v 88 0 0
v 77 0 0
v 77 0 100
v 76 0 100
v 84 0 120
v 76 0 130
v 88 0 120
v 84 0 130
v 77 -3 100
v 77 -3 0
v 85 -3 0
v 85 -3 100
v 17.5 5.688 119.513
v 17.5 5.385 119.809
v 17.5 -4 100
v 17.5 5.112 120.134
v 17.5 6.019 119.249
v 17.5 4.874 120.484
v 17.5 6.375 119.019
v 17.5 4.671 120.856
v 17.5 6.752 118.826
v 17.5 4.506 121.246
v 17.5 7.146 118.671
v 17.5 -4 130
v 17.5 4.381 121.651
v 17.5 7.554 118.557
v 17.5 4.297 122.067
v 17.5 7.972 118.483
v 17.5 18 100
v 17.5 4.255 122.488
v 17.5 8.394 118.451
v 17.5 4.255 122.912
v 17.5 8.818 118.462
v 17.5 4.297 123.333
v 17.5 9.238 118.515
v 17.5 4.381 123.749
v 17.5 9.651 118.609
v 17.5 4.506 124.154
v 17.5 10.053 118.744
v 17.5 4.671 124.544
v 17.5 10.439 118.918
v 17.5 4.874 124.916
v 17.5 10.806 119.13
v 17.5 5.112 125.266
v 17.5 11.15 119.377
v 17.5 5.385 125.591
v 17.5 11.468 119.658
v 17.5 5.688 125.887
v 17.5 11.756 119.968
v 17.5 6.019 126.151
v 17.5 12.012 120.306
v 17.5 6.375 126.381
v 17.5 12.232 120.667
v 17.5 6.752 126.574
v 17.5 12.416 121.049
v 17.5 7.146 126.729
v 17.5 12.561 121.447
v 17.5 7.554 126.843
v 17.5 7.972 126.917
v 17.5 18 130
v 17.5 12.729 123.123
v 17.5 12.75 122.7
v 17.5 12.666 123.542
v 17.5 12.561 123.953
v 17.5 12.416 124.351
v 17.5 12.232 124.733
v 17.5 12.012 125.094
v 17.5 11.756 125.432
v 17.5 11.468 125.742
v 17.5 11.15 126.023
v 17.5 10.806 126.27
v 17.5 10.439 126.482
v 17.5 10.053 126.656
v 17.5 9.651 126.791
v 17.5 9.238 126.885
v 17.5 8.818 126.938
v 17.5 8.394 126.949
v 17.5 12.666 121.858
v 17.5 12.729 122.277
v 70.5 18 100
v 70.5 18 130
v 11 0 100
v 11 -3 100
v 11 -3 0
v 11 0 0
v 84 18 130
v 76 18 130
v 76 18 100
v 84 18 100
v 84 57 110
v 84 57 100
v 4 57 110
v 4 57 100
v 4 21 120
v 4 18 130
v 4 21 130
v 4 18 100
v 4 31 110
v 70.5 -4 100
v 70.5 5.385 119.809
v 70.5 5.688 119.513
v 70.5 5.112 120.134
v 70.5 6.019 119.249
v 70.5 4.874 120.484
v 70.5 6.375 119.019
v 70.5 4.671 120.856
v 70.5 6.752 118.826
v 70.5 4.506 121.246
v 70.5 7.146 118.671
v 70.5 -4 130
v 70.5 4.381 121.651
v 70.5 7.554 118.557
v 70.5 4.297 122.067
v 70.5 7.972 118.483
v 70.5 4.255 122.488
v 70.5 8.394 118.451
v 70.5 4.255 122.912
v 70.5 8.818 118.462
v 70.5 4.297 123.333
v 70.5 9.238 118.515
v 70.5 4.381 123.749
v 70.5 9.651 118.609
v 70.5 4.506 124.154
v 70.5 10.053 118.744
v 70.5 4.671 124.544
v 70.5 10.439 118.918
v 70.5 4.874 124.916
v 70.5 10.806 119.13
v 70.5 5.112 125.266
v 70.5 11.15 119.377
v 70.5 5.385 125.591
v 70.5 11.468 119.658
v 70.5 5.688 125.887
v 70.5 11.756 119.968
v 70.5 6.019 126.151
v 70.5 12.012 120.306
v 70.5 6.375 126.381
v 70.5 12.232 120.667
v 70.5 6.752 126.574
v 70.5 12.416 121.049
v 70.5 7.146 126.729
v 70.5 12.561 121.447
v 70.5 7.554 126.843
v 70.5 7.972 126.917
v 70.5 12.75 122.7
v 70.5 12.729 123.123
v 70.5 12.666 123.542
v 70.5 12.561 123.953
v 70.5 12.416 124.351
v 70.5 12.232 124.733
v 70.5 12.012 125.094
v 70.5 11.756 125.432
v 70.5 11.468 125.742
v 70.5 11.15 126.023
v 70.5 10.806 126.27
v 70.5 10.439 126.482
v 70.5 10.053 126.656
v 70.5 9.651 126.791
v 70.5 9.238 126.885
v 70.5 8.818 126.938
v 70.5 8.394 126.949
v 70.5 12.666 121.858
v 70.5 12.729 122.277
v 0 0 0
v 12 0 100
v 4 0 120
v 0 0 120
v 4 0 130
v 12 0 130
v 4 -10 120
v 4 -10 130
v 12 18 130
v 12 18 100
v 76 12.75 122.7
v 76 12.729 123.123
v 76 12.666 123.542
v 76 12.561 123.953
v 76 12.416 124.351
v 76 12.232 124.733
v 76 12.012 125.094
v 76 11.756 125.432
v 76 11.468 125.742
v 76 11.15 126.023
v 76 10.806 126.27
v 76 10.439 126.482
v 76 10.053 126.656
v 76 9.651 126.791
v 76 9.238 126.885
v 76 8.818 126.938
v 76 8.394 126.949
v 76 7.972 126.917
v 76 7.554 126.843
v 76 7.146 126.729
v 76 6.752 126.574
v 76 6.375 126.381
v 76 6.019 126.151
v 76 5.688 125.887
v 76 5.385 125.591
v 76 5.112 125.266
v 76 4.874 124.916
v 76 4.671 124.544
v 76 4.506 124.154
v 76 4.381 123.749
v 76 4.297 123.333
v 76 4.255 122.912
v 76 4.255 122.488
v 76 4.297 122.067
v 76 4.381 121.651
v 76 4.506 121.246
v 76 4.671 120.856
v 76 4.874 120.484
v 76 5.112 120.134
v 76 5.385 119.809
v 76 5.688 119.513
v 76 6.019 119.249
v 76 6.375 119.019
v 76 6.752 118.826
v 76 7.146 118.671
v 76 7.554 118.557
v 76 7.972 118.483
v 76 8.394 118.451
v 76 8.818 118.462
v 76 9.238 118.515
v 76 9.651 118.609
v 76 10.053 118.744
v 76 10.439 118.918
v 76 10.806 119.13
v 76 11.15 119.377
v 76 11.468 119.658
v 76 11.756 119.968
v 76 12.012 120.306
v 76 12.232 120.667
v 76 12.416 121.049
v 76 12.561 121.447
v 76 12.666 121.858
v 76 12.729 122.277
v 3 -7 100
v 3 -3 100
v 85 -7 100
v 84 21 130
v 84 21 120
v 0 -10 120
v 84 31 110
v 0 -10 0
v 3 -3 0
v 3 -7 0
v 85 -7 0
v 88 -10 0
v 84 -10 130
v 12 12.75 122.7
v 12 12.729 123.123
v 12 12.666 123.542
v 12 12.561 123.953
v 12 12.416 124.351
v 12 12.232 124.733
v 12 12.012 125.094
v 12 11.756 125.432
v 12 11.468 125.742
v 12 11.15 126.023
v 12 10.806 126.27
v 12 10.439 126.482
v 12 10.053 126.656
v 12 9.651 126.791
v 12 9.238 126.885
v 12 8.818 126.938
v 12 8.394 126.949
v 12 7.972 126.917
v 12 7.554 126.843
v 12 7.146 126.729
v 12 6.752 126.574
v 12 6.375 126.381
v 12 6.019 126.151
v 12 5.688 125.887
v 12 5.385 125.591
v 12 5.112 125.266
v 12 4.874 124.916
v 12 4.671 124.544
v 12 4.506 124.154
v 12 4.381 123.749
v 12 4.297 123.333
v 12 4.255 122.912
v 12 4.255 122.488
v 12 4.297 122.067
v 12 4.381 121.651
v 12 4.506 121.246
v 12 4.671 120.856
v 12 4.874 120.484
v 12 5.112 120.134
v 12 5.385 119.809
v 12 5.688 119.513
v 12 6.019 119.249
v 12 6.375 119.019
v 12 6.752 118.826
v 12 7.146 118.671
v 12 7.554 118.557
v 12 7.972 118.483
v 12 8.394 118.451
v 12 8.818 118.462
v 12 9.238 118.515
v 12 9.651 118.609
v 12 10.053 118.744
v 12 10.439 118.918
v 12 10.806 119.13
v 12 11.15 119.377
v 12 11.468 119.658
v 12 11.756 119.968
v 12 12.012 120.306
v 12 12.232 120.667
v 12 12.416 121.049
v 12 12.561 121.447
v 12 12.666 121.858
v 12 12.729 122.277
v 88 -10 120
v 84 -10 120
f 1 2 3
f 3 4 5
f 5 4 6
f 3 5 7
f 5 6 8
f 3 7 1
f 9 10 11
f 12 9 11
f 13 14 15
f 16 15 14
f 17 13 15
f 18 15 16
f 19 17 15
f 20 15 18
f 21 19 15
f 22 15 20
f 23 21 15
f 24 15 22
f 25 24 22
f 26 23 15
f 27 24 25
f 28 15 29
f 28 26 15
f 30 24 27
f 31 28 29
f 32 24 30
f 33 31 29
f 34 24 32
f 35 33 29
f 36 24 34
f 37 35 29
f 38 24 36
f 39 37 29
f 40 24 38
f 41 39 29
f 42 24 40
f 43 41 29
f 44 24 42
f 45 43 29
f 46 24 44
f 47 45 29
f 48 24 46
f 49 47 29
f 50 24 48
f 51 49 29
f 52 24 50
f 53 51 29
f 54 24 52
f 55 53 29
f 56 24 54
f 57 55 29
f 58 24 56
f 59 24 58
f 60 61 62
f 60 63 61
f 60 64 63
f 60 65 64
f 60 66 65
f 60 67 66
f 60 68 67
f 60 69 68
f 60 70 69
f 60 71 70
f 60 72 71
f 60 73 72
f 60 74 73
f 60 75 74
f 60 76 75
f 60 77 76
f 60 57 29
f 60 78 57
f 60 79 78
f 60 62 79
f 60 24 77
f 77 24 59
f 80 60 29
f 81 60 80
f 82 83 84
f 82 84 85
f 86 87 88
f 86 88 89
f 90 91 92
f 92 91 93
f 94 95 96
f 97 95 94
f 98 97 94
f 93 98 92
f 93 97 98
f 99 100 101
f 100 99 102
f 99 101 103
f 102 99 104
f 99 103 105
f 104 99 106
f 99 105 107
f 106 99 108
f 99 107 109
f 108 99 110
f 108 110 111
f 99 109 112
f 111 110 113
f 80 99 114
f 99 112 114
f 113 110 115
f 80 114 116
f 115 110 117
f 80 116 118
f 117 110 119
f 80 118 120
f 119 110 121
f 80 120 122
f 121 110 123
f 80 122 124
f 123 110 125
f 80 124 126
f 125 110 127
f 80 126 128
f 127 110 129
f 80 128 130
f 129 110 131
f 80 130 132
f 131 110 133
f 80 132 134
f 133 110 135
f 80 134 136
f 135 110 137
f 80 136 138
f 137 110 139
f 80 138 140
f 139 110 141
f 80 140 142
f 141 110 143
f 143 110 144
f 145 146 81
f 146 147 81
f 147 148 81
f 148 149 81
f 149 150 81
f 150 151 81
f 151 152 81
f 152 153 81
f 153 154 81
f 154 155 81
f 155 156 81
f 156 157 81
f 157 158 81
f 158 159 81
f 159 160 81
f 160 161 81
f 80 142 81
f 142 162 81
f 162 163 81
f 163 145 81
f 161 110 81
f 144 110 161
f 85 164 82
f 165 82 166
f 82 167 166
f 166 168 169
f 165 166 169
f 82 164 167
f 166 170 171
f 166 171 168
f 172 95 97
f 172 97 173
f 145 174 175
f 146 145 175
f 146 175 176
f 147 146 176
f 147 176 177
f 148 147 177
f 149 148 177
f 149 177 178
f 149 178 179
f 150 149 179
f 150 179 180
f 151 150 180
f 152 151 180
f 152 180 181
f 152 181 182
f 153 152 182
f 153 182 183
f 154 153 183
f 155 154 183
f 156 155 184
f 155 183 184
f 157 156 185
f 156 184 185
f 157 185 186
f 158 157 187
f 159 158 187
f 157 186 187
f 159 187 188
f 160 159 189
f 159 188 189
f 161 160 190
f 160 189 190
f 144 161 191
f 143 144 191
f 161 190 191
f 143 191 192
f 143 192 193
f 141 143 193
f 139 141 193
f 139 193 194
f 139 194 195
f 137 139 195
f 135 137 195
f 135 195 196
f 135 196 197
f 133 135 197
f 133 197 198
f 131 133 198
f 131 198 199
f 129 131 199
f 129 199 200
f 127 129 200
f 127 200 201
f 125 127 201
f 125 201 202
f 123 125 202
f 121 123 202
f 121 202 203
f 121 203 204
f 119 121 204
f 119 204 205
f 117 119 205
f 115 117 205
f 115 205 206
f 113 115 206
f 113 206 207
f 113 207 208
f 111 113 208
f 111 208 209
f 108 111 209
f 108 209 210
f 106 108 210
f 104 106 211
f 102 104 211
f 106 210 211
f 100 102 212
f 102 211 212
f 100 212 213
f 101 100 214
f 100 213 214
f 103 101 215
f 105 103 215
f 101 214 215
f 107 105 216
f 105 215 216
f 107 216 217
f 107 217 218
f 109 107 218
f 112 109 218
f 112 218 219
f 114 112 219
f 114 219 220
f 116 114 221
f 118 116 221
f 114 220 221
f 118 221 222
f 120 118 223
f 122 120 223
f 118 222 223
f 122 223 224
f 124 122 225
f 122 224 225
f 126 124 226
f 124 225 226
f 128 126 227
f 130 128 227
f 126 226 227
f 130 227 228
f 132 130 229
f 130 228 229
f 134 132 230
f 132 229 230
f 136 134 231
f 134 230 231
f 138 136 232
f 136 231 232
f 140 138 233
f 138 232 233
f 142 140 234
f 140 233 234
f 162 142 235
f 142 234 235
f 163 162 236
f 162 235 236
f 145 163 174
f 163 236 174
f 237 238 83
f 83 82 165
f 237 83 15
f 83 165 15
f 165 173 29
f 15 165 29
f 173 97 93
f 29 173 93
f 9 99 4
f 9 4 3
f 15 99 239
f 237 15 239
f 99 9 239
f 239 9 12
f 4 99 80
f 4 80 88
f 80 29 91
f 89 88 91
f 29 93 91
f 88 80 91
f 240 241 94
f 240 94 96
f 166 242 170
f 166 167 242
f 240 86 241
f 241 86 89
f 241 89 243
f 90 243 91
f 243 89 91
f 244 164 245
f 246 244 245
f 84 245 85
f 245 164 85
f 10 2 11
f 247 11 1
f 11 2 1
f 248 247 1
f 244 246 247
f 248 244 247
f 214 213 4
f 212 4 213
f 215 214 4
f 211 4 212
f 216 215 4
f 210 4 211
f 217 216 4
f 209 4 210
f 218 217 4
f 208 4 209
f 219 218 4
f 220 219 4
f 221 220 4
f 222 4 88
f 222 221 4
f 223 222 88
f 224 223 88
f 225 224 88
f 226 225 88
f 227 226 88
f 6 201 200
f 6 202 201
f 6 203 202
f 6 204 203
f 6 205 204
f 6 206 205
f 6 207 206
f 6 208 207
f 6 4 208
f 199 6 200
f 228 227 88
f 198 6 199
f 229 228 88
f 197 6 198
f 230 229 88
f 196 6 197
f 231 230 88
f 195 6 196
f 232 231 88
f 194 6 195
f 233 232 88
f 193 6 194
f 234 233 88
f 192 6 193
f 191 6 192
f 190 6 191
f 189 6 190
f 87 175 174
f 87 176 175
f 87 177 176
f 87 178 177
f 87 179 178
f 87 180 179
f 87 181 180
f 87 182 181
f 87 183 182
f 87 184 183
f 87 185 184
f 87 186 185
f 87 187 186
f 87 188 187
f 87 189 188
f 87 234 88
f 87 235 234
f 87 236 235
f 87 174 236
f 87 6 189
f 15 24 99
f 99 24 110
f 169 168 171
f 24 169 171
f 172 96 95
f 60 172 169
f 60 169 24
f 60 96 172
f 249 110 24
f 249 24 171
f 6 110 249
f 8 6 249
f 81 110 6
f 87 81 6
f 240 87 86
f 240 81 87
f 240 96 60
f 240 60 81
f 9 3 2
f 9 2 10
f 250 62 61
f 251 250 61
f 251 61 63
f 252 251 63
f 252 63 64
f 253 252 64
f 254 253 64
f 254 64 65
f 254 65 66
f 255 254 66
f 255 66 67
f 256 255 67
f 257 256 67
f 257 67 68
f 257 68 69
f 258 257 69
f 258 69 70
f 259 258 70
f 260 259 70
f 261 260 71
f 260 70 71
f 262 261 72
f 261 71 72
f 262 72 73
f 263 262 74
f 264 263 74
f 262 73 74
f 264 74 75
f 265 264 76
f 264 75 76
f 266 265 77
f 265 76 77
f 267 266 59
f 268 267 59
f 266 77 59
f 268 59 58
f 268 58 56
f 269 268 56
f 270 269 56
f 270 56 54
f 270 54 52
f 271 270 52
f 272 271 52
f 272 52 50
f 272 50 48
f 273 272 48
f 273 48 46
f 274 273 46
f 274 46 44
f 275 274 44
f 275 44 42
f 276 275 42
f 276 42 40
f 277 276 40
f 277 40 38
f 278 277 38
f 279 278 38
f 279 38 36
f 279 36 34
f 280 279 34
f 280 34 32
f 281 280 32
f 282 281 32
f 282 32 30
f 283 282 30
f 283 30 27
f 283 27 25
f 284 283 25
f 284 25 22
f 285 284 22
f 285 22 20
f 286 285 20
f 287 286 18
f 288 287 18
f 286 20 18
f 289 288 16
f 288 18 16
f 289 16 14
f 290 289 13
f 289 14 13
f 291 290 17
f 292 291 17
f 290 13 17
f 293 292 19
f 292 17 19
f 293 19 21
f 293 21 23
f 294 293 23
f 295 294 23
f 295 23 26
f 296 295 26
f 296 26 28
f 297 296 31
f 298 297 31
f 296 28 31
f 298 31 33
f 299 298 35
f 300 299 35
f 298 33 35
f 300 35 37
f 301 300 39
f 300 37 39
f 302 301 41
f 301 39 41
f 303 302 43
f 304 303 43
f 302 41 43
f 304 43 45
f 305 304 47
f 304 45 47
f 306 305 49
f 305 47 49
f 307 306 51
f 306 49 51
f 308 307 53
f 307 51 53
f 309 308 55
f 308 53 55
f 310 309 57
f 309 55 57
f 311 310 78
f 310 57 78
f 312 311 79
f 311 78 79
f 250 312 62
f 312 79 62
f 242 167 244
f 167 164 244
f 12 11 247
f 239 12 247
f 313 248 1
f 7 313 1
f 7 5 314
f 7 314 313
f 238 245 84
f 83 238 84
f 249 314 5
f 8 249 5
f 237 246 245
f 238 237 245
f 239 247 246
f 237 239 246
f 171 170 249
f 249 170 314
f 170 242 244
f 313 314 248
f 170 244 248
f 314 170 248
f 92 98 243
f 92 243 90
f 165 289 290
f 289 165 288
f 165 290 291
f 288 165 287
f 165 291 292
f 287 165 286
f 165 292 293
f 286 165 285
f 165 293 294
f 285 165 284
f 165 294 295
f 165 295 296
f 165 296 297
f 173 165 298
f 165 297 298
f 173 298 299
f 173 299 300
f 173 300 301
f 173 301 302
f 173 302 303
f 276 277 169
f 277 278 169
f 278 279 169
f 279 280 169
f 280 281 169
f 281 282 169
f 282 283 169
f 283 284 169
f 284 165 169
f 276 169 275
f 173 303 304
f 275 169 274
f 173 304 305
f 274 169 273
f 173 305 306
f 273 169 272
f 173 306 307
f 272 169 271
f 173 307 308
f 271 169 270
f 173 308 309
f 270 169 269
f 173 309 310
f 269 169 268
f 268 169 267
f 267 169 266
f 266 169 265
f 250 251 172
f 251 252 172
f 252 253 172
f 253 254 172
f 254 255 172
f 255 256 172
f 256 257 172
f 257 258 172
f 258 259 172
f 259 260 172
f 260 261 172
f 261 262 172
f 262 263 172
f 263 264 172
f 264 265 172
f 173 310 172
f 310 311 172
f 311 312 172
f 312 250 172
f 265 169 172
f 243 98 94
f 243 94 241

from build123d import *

# Parameters (mm, degrees)
BOSS_EXTRUDE1_DEPTH = 100
BOSS_EXTRUDE2_DEPTH = 20
SKETCH4_W           = 80
SKETCH4_H           = 31
BOSS_EXTRUDE3_DEPTH = 10
SKETCH4_2_W         = 80
SKETCH4_2_H         = 31
BOSS_EXTRUDE4_DEPTH = 20
SKETCH5_W           = 53
SKETCH5_H           = 22
SKETCH5_W_2         = 8
SKETCH5_H_2         = 18
CUT_EXTRUDE1_DEPTH  = 30
SKETCH6_W           = 10
SKETCH6_H           = 36
CUT_EXTRUDE2_DEPTH  = 80
SKETCH7_R           = 4.25
CUT_EXTRUDE3_DEPTH  = 162.012421881
CHAMFER1_SIZE       = 10


with BuildPart() as part:
    # Sketch1 → Boss-Extrude1 (new body)
    with BuildSketch(Plane.XY):
        Polygon((11, 0), (0, 0), (0, -10), (88, -10), (88, 0), (77, 0), (77, -3), (85, -3), (85, -7), (3, -7), (3, -3), (11, -3), align=None)
    extrude(amount=BOSS_EXTRUDE1_DEPTH)

    # Sketch2 → Boss-Extrude2 (add)
    with BuildSketch(Plane.XY.offset(100)):
        Polygon((77, 0), (11, 0), (11, -3), (3, -3), (3, -7), (85, -7), (85, -3), (77, -3), align=None)
        Polygon((4, 57), (4, 0), (11, 0), (77, 0), (84, 0), (84, 57), align=None)
        Polygon((0, 0), (0, -10), (88, -10), (88, 0), (84, 0), (77, 0), (77, -3), (85, -3), (85, -7), (3, -7), (3, -3), (11, -3), (11, 0), (4, 0), align=None)
    extrude(amount=BOSS_EXTRUDE2_DEPTH)

    # Sketch4 → Boss-Extrude3 (add)
    with BuildSketch(Plane.XY.offset(120)):
        with Locations((44, 5.5)):
            Rectangle(SKETCH4_W, SKETCH4_H)
    extrude(amount=BOSS_EXTRUDE3_DEPTH)

    # Sketch4<2> → Boss-Extrude4 (add)
    with BuildSketch(Plane.XY.offset(120)):
        with Locations((44, 5.5)):
            Rectangle(SKETCH4_2_W, SKETCH4_2_H)
    extrude(amount=-BOSS_EXTRUDE4_DEPTH)

    # Sketch5 → Cut-Extrude1 (cut)
    with BuildSketch(Plane.XY.offset(130)):
        with Locations((44, 7)):
            Rectangle(SKETCH5_W, SKETCH5_H)
        with Locations((8, 9)):
            Rectangle(SKETCH5_W_2, SKETCH5_H_2)
        with Locations((80, 9)):
            Rectangle(SKETCH5_W_2, SKETCH5_H_2)
    extrude(amount=-CUT_EXTRUDE1_DEPTH, mode=Mode.SUBTRACT)

    # Sketch6 → Cut-Extrude2 (cut)
    with BuildSketch(Plane.ZY.offset(-4)):
        with Locations((115, 39)):
            Rectangle(SKETCH6_W, SKETCH6_H)
    extrude(amount=-CUT_EXTRUDE2_DEPTH, mode=Mode.SUBTRACT)

    # Sketch7 → Cut-Extrude3 (cut, through all)
    with BuildSketch(Plane(origin=(76, 0, 0), x_dir=(0, 0, -1), z_dir=(1, 0, 0))):
        with Locations(Location((-122.7, 8.5, 0), (0, 0, 90))):
            Circle(SKETCH7_R)
    extrude(amount=-CUT_EXTRUDE3_DEPTH, mode=Mode.SUBTRACT)

    # Chamfer1
    chamfer1_edges = [part.edges().sort_by_distance(p)[0] for p in [
        (44, 21, 110),
    ]]
    chamfer(chamfer1_edges, length=CHAMFER1_SIZE)


solid = part.part
